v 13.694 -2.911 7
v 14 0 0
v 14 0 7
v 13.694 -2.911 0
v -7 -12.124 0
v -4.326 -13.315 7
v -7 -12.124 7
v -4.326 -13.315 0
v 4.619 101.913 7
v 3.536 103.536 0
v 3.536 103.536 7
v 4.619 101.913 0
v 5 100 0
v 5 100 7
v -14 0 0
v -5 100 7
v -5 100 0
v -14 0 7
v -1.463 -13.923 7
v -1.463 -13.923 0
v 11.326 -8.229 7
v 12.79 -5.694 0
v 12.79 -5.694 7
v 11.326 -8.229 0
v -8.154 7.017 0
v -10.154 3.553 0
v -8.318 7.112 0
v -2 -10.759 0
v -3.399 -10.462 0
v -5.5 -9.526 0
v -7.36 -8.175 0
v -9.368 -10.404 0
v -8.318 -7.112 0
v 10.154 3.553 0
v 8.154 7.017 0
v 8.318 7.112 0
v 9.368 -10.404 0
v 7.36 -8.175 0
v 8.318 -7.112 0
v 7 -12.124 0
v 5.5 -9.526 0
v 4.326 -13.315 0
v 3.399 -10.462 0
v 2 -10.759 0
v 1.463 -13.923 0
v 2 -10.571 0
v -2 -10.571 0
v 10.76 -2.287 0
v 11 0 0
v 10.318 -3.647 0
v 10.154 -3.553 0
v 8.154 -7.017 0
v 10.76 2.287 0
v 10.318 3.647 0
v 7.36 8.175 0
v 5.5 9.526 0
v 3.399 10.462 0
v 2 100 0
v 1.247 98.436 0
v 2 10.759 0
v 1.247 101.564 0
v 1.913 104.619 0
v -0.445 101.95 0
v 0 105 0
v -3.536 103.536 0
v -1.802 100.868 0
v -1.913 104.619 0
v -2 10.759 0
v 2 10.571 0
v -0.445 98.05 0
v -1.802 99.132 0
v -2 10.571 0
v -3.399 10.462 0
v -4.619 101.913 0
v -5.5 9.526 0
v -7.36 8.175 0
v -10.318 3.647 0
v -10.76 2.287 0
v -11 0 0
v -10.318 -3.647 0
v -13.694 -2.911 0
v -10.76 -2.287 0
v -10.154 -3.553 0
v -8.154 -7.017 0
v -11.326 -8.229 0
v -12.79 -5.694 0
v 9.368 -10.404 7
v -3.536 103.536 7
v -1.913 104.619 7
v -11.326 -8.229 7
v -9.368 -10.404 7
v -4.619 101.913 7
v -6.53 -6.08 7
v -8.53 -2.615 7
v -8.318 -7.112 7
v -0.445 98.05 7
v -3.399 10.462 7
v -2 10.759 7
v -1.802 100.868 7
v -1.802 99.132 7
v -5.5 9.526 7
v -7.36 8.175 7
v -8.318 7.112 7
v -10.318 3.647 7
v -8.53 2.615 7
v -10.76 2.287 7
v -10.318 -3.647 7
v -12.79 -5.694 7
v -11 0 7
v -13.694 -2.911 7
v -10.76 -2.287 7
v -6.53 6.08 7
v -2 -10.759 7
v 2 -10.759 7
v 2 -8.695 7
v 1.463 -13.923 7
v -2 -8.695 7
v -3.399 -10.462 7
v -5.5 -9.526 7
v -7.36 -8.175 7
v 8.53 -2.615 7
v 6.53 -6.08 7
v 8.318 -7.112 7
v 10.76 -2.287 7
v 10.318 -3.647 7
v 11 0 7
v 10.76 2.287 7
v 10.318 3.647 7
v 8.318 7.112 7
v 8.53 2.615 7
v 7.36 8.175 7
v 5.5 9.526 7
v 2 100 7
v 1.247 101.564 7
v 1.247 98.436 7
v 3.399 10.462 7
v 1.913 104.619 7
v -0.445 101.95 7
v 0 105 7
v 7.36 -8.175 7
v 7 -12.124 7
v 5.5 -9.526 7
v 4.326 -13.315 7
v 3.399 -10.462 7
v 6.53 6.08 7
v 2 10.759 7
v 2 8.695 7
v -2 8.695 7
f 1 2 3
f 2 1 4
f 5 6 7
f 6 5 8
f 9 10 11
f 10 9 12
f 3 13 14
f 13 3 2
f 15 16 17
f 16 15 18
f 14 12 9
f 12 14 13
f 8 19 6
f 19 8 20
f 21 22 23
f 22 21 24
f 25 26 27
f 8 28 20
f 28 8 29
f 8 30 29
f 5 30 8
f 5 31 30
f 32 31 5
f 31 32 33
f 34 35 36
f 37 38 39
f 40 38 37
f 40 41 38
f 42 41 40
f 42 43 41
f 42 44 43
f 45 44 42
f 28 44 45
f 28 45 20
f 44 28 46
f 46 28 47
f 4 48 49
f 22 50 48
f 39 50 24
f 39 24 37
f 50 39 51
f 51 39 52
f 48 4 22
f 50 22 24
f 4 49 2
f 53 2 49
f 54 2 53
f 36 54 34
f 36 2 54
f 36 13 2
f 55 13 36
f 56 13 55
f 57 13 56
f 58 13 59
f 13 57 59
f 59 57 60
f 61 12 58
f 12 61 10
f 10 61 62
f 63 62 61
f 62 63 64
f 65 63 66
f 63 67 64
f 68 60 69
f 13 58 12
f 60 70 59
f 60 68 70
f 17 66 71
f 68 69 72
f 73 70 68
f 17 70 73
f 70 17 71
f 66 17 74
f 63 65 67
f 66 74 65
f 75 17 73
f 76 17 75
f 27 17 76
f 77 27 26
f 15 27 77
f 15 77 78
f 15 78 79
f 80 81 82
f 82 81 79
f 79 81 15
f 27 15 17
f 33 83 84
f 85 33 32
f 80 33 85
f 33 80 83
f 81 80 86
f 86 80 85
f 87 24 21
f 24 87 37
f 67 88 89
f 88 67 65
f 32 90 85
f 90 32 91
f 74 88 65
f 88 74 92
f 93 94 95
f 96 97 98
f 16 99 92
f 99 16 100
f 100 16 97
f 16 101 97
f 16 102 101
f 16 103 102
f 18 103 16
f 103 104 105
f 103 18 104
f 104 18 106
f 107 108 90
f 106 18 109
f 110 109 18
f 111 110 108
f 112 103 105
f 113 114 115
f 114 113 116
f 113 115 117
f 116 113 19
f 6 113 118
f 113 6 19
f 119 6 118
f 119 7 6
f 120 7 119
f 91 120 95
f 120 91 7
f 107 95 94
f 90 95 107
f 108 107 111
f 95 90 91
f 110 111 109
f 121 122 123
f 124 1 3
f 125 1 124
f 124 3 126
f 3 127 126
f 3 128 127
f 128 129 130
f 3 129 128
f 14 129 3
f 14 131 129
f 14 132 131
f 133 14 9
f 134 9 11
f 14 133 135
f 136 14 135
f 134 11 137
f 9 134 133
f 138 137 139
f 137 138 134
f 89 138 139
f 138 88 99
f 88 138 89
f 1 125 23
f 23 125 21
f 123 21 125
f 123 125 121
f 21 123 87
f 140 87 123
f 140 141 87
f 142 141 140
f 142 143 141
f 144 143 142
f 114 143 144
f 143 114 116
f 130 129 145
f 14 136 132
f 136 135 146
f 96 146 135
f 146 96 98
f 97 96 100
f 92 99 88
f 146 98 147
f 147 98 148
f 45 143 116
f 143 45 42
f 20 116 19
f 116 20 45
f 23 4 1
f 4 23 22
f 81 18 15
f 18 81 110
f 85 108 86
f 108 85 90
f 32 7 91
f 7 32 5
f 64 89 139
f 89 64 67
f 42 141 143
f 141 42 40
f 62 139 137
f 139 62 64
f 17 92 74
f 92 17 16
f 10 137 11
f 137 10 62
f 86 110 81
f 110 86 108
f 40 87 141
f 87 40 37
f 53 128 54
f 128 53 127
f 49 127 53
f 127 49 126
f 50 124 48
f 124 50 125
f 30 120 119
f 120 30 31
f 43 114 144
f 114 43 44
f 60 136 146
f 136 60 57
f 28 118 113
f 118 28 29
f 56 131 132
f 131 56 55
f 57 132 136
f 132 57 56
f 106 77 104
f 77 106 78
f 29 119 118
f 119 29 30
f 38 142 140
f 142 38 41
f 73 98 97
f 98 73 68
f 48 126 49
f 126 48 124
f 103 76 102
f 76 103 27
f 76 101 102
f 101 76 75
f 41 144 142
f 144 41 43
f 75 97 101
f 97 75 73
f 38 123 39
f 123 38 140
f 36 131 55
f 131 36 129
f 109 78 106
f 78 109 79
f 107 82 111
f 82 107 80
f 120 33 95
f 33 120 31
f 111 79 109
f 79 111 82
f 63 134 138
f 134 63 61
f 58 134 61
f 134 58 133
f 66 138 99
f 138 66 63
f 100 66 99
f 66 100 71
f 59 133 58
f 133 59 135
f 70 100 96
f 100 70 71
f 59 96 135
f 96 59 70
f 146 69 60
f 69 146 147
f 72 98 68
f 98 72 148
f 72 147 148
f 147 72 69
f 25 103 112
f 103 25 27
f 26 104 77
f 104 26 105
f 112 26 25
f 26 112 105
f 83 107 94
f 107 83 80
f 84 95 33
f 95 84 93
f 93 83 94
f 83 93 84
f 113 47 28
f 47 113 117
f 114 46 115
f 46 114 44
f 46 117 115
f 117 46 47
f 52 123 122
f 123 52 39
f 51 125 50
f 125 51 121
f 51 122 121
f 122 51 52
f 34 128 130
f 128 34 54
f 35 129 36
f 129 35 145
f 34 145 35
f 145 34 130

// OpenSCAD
//Design by Bogdan Ionescu 2019
//Liscence GPL 2.0

handle_l = 100;

difference(){
    union(){
        hull(){
            cylinder(d = 28, h = 7);
            translate([0,handle_l,0])cylinder(d = 10, h = 7);
        }
        
        
    }
    cylinder(d = 22, h = 10);
    translate([0,handle_l,0])cylinder(d = 4, h = 7);
    //translate([2,-15,0])cube([30,30,7]);
    //translate([0,-22/2,0])cube([30,22,7]);
}
for(i = [0:360/6:360]){
            rotate([0,0,i])translate([-2,17/2,0]){
                difference(){
                    cube([4,4,7]);
                    rotate([15,0,0])translate([0,-2,-2])cube([4,4,10]);
                }
            }
        }
